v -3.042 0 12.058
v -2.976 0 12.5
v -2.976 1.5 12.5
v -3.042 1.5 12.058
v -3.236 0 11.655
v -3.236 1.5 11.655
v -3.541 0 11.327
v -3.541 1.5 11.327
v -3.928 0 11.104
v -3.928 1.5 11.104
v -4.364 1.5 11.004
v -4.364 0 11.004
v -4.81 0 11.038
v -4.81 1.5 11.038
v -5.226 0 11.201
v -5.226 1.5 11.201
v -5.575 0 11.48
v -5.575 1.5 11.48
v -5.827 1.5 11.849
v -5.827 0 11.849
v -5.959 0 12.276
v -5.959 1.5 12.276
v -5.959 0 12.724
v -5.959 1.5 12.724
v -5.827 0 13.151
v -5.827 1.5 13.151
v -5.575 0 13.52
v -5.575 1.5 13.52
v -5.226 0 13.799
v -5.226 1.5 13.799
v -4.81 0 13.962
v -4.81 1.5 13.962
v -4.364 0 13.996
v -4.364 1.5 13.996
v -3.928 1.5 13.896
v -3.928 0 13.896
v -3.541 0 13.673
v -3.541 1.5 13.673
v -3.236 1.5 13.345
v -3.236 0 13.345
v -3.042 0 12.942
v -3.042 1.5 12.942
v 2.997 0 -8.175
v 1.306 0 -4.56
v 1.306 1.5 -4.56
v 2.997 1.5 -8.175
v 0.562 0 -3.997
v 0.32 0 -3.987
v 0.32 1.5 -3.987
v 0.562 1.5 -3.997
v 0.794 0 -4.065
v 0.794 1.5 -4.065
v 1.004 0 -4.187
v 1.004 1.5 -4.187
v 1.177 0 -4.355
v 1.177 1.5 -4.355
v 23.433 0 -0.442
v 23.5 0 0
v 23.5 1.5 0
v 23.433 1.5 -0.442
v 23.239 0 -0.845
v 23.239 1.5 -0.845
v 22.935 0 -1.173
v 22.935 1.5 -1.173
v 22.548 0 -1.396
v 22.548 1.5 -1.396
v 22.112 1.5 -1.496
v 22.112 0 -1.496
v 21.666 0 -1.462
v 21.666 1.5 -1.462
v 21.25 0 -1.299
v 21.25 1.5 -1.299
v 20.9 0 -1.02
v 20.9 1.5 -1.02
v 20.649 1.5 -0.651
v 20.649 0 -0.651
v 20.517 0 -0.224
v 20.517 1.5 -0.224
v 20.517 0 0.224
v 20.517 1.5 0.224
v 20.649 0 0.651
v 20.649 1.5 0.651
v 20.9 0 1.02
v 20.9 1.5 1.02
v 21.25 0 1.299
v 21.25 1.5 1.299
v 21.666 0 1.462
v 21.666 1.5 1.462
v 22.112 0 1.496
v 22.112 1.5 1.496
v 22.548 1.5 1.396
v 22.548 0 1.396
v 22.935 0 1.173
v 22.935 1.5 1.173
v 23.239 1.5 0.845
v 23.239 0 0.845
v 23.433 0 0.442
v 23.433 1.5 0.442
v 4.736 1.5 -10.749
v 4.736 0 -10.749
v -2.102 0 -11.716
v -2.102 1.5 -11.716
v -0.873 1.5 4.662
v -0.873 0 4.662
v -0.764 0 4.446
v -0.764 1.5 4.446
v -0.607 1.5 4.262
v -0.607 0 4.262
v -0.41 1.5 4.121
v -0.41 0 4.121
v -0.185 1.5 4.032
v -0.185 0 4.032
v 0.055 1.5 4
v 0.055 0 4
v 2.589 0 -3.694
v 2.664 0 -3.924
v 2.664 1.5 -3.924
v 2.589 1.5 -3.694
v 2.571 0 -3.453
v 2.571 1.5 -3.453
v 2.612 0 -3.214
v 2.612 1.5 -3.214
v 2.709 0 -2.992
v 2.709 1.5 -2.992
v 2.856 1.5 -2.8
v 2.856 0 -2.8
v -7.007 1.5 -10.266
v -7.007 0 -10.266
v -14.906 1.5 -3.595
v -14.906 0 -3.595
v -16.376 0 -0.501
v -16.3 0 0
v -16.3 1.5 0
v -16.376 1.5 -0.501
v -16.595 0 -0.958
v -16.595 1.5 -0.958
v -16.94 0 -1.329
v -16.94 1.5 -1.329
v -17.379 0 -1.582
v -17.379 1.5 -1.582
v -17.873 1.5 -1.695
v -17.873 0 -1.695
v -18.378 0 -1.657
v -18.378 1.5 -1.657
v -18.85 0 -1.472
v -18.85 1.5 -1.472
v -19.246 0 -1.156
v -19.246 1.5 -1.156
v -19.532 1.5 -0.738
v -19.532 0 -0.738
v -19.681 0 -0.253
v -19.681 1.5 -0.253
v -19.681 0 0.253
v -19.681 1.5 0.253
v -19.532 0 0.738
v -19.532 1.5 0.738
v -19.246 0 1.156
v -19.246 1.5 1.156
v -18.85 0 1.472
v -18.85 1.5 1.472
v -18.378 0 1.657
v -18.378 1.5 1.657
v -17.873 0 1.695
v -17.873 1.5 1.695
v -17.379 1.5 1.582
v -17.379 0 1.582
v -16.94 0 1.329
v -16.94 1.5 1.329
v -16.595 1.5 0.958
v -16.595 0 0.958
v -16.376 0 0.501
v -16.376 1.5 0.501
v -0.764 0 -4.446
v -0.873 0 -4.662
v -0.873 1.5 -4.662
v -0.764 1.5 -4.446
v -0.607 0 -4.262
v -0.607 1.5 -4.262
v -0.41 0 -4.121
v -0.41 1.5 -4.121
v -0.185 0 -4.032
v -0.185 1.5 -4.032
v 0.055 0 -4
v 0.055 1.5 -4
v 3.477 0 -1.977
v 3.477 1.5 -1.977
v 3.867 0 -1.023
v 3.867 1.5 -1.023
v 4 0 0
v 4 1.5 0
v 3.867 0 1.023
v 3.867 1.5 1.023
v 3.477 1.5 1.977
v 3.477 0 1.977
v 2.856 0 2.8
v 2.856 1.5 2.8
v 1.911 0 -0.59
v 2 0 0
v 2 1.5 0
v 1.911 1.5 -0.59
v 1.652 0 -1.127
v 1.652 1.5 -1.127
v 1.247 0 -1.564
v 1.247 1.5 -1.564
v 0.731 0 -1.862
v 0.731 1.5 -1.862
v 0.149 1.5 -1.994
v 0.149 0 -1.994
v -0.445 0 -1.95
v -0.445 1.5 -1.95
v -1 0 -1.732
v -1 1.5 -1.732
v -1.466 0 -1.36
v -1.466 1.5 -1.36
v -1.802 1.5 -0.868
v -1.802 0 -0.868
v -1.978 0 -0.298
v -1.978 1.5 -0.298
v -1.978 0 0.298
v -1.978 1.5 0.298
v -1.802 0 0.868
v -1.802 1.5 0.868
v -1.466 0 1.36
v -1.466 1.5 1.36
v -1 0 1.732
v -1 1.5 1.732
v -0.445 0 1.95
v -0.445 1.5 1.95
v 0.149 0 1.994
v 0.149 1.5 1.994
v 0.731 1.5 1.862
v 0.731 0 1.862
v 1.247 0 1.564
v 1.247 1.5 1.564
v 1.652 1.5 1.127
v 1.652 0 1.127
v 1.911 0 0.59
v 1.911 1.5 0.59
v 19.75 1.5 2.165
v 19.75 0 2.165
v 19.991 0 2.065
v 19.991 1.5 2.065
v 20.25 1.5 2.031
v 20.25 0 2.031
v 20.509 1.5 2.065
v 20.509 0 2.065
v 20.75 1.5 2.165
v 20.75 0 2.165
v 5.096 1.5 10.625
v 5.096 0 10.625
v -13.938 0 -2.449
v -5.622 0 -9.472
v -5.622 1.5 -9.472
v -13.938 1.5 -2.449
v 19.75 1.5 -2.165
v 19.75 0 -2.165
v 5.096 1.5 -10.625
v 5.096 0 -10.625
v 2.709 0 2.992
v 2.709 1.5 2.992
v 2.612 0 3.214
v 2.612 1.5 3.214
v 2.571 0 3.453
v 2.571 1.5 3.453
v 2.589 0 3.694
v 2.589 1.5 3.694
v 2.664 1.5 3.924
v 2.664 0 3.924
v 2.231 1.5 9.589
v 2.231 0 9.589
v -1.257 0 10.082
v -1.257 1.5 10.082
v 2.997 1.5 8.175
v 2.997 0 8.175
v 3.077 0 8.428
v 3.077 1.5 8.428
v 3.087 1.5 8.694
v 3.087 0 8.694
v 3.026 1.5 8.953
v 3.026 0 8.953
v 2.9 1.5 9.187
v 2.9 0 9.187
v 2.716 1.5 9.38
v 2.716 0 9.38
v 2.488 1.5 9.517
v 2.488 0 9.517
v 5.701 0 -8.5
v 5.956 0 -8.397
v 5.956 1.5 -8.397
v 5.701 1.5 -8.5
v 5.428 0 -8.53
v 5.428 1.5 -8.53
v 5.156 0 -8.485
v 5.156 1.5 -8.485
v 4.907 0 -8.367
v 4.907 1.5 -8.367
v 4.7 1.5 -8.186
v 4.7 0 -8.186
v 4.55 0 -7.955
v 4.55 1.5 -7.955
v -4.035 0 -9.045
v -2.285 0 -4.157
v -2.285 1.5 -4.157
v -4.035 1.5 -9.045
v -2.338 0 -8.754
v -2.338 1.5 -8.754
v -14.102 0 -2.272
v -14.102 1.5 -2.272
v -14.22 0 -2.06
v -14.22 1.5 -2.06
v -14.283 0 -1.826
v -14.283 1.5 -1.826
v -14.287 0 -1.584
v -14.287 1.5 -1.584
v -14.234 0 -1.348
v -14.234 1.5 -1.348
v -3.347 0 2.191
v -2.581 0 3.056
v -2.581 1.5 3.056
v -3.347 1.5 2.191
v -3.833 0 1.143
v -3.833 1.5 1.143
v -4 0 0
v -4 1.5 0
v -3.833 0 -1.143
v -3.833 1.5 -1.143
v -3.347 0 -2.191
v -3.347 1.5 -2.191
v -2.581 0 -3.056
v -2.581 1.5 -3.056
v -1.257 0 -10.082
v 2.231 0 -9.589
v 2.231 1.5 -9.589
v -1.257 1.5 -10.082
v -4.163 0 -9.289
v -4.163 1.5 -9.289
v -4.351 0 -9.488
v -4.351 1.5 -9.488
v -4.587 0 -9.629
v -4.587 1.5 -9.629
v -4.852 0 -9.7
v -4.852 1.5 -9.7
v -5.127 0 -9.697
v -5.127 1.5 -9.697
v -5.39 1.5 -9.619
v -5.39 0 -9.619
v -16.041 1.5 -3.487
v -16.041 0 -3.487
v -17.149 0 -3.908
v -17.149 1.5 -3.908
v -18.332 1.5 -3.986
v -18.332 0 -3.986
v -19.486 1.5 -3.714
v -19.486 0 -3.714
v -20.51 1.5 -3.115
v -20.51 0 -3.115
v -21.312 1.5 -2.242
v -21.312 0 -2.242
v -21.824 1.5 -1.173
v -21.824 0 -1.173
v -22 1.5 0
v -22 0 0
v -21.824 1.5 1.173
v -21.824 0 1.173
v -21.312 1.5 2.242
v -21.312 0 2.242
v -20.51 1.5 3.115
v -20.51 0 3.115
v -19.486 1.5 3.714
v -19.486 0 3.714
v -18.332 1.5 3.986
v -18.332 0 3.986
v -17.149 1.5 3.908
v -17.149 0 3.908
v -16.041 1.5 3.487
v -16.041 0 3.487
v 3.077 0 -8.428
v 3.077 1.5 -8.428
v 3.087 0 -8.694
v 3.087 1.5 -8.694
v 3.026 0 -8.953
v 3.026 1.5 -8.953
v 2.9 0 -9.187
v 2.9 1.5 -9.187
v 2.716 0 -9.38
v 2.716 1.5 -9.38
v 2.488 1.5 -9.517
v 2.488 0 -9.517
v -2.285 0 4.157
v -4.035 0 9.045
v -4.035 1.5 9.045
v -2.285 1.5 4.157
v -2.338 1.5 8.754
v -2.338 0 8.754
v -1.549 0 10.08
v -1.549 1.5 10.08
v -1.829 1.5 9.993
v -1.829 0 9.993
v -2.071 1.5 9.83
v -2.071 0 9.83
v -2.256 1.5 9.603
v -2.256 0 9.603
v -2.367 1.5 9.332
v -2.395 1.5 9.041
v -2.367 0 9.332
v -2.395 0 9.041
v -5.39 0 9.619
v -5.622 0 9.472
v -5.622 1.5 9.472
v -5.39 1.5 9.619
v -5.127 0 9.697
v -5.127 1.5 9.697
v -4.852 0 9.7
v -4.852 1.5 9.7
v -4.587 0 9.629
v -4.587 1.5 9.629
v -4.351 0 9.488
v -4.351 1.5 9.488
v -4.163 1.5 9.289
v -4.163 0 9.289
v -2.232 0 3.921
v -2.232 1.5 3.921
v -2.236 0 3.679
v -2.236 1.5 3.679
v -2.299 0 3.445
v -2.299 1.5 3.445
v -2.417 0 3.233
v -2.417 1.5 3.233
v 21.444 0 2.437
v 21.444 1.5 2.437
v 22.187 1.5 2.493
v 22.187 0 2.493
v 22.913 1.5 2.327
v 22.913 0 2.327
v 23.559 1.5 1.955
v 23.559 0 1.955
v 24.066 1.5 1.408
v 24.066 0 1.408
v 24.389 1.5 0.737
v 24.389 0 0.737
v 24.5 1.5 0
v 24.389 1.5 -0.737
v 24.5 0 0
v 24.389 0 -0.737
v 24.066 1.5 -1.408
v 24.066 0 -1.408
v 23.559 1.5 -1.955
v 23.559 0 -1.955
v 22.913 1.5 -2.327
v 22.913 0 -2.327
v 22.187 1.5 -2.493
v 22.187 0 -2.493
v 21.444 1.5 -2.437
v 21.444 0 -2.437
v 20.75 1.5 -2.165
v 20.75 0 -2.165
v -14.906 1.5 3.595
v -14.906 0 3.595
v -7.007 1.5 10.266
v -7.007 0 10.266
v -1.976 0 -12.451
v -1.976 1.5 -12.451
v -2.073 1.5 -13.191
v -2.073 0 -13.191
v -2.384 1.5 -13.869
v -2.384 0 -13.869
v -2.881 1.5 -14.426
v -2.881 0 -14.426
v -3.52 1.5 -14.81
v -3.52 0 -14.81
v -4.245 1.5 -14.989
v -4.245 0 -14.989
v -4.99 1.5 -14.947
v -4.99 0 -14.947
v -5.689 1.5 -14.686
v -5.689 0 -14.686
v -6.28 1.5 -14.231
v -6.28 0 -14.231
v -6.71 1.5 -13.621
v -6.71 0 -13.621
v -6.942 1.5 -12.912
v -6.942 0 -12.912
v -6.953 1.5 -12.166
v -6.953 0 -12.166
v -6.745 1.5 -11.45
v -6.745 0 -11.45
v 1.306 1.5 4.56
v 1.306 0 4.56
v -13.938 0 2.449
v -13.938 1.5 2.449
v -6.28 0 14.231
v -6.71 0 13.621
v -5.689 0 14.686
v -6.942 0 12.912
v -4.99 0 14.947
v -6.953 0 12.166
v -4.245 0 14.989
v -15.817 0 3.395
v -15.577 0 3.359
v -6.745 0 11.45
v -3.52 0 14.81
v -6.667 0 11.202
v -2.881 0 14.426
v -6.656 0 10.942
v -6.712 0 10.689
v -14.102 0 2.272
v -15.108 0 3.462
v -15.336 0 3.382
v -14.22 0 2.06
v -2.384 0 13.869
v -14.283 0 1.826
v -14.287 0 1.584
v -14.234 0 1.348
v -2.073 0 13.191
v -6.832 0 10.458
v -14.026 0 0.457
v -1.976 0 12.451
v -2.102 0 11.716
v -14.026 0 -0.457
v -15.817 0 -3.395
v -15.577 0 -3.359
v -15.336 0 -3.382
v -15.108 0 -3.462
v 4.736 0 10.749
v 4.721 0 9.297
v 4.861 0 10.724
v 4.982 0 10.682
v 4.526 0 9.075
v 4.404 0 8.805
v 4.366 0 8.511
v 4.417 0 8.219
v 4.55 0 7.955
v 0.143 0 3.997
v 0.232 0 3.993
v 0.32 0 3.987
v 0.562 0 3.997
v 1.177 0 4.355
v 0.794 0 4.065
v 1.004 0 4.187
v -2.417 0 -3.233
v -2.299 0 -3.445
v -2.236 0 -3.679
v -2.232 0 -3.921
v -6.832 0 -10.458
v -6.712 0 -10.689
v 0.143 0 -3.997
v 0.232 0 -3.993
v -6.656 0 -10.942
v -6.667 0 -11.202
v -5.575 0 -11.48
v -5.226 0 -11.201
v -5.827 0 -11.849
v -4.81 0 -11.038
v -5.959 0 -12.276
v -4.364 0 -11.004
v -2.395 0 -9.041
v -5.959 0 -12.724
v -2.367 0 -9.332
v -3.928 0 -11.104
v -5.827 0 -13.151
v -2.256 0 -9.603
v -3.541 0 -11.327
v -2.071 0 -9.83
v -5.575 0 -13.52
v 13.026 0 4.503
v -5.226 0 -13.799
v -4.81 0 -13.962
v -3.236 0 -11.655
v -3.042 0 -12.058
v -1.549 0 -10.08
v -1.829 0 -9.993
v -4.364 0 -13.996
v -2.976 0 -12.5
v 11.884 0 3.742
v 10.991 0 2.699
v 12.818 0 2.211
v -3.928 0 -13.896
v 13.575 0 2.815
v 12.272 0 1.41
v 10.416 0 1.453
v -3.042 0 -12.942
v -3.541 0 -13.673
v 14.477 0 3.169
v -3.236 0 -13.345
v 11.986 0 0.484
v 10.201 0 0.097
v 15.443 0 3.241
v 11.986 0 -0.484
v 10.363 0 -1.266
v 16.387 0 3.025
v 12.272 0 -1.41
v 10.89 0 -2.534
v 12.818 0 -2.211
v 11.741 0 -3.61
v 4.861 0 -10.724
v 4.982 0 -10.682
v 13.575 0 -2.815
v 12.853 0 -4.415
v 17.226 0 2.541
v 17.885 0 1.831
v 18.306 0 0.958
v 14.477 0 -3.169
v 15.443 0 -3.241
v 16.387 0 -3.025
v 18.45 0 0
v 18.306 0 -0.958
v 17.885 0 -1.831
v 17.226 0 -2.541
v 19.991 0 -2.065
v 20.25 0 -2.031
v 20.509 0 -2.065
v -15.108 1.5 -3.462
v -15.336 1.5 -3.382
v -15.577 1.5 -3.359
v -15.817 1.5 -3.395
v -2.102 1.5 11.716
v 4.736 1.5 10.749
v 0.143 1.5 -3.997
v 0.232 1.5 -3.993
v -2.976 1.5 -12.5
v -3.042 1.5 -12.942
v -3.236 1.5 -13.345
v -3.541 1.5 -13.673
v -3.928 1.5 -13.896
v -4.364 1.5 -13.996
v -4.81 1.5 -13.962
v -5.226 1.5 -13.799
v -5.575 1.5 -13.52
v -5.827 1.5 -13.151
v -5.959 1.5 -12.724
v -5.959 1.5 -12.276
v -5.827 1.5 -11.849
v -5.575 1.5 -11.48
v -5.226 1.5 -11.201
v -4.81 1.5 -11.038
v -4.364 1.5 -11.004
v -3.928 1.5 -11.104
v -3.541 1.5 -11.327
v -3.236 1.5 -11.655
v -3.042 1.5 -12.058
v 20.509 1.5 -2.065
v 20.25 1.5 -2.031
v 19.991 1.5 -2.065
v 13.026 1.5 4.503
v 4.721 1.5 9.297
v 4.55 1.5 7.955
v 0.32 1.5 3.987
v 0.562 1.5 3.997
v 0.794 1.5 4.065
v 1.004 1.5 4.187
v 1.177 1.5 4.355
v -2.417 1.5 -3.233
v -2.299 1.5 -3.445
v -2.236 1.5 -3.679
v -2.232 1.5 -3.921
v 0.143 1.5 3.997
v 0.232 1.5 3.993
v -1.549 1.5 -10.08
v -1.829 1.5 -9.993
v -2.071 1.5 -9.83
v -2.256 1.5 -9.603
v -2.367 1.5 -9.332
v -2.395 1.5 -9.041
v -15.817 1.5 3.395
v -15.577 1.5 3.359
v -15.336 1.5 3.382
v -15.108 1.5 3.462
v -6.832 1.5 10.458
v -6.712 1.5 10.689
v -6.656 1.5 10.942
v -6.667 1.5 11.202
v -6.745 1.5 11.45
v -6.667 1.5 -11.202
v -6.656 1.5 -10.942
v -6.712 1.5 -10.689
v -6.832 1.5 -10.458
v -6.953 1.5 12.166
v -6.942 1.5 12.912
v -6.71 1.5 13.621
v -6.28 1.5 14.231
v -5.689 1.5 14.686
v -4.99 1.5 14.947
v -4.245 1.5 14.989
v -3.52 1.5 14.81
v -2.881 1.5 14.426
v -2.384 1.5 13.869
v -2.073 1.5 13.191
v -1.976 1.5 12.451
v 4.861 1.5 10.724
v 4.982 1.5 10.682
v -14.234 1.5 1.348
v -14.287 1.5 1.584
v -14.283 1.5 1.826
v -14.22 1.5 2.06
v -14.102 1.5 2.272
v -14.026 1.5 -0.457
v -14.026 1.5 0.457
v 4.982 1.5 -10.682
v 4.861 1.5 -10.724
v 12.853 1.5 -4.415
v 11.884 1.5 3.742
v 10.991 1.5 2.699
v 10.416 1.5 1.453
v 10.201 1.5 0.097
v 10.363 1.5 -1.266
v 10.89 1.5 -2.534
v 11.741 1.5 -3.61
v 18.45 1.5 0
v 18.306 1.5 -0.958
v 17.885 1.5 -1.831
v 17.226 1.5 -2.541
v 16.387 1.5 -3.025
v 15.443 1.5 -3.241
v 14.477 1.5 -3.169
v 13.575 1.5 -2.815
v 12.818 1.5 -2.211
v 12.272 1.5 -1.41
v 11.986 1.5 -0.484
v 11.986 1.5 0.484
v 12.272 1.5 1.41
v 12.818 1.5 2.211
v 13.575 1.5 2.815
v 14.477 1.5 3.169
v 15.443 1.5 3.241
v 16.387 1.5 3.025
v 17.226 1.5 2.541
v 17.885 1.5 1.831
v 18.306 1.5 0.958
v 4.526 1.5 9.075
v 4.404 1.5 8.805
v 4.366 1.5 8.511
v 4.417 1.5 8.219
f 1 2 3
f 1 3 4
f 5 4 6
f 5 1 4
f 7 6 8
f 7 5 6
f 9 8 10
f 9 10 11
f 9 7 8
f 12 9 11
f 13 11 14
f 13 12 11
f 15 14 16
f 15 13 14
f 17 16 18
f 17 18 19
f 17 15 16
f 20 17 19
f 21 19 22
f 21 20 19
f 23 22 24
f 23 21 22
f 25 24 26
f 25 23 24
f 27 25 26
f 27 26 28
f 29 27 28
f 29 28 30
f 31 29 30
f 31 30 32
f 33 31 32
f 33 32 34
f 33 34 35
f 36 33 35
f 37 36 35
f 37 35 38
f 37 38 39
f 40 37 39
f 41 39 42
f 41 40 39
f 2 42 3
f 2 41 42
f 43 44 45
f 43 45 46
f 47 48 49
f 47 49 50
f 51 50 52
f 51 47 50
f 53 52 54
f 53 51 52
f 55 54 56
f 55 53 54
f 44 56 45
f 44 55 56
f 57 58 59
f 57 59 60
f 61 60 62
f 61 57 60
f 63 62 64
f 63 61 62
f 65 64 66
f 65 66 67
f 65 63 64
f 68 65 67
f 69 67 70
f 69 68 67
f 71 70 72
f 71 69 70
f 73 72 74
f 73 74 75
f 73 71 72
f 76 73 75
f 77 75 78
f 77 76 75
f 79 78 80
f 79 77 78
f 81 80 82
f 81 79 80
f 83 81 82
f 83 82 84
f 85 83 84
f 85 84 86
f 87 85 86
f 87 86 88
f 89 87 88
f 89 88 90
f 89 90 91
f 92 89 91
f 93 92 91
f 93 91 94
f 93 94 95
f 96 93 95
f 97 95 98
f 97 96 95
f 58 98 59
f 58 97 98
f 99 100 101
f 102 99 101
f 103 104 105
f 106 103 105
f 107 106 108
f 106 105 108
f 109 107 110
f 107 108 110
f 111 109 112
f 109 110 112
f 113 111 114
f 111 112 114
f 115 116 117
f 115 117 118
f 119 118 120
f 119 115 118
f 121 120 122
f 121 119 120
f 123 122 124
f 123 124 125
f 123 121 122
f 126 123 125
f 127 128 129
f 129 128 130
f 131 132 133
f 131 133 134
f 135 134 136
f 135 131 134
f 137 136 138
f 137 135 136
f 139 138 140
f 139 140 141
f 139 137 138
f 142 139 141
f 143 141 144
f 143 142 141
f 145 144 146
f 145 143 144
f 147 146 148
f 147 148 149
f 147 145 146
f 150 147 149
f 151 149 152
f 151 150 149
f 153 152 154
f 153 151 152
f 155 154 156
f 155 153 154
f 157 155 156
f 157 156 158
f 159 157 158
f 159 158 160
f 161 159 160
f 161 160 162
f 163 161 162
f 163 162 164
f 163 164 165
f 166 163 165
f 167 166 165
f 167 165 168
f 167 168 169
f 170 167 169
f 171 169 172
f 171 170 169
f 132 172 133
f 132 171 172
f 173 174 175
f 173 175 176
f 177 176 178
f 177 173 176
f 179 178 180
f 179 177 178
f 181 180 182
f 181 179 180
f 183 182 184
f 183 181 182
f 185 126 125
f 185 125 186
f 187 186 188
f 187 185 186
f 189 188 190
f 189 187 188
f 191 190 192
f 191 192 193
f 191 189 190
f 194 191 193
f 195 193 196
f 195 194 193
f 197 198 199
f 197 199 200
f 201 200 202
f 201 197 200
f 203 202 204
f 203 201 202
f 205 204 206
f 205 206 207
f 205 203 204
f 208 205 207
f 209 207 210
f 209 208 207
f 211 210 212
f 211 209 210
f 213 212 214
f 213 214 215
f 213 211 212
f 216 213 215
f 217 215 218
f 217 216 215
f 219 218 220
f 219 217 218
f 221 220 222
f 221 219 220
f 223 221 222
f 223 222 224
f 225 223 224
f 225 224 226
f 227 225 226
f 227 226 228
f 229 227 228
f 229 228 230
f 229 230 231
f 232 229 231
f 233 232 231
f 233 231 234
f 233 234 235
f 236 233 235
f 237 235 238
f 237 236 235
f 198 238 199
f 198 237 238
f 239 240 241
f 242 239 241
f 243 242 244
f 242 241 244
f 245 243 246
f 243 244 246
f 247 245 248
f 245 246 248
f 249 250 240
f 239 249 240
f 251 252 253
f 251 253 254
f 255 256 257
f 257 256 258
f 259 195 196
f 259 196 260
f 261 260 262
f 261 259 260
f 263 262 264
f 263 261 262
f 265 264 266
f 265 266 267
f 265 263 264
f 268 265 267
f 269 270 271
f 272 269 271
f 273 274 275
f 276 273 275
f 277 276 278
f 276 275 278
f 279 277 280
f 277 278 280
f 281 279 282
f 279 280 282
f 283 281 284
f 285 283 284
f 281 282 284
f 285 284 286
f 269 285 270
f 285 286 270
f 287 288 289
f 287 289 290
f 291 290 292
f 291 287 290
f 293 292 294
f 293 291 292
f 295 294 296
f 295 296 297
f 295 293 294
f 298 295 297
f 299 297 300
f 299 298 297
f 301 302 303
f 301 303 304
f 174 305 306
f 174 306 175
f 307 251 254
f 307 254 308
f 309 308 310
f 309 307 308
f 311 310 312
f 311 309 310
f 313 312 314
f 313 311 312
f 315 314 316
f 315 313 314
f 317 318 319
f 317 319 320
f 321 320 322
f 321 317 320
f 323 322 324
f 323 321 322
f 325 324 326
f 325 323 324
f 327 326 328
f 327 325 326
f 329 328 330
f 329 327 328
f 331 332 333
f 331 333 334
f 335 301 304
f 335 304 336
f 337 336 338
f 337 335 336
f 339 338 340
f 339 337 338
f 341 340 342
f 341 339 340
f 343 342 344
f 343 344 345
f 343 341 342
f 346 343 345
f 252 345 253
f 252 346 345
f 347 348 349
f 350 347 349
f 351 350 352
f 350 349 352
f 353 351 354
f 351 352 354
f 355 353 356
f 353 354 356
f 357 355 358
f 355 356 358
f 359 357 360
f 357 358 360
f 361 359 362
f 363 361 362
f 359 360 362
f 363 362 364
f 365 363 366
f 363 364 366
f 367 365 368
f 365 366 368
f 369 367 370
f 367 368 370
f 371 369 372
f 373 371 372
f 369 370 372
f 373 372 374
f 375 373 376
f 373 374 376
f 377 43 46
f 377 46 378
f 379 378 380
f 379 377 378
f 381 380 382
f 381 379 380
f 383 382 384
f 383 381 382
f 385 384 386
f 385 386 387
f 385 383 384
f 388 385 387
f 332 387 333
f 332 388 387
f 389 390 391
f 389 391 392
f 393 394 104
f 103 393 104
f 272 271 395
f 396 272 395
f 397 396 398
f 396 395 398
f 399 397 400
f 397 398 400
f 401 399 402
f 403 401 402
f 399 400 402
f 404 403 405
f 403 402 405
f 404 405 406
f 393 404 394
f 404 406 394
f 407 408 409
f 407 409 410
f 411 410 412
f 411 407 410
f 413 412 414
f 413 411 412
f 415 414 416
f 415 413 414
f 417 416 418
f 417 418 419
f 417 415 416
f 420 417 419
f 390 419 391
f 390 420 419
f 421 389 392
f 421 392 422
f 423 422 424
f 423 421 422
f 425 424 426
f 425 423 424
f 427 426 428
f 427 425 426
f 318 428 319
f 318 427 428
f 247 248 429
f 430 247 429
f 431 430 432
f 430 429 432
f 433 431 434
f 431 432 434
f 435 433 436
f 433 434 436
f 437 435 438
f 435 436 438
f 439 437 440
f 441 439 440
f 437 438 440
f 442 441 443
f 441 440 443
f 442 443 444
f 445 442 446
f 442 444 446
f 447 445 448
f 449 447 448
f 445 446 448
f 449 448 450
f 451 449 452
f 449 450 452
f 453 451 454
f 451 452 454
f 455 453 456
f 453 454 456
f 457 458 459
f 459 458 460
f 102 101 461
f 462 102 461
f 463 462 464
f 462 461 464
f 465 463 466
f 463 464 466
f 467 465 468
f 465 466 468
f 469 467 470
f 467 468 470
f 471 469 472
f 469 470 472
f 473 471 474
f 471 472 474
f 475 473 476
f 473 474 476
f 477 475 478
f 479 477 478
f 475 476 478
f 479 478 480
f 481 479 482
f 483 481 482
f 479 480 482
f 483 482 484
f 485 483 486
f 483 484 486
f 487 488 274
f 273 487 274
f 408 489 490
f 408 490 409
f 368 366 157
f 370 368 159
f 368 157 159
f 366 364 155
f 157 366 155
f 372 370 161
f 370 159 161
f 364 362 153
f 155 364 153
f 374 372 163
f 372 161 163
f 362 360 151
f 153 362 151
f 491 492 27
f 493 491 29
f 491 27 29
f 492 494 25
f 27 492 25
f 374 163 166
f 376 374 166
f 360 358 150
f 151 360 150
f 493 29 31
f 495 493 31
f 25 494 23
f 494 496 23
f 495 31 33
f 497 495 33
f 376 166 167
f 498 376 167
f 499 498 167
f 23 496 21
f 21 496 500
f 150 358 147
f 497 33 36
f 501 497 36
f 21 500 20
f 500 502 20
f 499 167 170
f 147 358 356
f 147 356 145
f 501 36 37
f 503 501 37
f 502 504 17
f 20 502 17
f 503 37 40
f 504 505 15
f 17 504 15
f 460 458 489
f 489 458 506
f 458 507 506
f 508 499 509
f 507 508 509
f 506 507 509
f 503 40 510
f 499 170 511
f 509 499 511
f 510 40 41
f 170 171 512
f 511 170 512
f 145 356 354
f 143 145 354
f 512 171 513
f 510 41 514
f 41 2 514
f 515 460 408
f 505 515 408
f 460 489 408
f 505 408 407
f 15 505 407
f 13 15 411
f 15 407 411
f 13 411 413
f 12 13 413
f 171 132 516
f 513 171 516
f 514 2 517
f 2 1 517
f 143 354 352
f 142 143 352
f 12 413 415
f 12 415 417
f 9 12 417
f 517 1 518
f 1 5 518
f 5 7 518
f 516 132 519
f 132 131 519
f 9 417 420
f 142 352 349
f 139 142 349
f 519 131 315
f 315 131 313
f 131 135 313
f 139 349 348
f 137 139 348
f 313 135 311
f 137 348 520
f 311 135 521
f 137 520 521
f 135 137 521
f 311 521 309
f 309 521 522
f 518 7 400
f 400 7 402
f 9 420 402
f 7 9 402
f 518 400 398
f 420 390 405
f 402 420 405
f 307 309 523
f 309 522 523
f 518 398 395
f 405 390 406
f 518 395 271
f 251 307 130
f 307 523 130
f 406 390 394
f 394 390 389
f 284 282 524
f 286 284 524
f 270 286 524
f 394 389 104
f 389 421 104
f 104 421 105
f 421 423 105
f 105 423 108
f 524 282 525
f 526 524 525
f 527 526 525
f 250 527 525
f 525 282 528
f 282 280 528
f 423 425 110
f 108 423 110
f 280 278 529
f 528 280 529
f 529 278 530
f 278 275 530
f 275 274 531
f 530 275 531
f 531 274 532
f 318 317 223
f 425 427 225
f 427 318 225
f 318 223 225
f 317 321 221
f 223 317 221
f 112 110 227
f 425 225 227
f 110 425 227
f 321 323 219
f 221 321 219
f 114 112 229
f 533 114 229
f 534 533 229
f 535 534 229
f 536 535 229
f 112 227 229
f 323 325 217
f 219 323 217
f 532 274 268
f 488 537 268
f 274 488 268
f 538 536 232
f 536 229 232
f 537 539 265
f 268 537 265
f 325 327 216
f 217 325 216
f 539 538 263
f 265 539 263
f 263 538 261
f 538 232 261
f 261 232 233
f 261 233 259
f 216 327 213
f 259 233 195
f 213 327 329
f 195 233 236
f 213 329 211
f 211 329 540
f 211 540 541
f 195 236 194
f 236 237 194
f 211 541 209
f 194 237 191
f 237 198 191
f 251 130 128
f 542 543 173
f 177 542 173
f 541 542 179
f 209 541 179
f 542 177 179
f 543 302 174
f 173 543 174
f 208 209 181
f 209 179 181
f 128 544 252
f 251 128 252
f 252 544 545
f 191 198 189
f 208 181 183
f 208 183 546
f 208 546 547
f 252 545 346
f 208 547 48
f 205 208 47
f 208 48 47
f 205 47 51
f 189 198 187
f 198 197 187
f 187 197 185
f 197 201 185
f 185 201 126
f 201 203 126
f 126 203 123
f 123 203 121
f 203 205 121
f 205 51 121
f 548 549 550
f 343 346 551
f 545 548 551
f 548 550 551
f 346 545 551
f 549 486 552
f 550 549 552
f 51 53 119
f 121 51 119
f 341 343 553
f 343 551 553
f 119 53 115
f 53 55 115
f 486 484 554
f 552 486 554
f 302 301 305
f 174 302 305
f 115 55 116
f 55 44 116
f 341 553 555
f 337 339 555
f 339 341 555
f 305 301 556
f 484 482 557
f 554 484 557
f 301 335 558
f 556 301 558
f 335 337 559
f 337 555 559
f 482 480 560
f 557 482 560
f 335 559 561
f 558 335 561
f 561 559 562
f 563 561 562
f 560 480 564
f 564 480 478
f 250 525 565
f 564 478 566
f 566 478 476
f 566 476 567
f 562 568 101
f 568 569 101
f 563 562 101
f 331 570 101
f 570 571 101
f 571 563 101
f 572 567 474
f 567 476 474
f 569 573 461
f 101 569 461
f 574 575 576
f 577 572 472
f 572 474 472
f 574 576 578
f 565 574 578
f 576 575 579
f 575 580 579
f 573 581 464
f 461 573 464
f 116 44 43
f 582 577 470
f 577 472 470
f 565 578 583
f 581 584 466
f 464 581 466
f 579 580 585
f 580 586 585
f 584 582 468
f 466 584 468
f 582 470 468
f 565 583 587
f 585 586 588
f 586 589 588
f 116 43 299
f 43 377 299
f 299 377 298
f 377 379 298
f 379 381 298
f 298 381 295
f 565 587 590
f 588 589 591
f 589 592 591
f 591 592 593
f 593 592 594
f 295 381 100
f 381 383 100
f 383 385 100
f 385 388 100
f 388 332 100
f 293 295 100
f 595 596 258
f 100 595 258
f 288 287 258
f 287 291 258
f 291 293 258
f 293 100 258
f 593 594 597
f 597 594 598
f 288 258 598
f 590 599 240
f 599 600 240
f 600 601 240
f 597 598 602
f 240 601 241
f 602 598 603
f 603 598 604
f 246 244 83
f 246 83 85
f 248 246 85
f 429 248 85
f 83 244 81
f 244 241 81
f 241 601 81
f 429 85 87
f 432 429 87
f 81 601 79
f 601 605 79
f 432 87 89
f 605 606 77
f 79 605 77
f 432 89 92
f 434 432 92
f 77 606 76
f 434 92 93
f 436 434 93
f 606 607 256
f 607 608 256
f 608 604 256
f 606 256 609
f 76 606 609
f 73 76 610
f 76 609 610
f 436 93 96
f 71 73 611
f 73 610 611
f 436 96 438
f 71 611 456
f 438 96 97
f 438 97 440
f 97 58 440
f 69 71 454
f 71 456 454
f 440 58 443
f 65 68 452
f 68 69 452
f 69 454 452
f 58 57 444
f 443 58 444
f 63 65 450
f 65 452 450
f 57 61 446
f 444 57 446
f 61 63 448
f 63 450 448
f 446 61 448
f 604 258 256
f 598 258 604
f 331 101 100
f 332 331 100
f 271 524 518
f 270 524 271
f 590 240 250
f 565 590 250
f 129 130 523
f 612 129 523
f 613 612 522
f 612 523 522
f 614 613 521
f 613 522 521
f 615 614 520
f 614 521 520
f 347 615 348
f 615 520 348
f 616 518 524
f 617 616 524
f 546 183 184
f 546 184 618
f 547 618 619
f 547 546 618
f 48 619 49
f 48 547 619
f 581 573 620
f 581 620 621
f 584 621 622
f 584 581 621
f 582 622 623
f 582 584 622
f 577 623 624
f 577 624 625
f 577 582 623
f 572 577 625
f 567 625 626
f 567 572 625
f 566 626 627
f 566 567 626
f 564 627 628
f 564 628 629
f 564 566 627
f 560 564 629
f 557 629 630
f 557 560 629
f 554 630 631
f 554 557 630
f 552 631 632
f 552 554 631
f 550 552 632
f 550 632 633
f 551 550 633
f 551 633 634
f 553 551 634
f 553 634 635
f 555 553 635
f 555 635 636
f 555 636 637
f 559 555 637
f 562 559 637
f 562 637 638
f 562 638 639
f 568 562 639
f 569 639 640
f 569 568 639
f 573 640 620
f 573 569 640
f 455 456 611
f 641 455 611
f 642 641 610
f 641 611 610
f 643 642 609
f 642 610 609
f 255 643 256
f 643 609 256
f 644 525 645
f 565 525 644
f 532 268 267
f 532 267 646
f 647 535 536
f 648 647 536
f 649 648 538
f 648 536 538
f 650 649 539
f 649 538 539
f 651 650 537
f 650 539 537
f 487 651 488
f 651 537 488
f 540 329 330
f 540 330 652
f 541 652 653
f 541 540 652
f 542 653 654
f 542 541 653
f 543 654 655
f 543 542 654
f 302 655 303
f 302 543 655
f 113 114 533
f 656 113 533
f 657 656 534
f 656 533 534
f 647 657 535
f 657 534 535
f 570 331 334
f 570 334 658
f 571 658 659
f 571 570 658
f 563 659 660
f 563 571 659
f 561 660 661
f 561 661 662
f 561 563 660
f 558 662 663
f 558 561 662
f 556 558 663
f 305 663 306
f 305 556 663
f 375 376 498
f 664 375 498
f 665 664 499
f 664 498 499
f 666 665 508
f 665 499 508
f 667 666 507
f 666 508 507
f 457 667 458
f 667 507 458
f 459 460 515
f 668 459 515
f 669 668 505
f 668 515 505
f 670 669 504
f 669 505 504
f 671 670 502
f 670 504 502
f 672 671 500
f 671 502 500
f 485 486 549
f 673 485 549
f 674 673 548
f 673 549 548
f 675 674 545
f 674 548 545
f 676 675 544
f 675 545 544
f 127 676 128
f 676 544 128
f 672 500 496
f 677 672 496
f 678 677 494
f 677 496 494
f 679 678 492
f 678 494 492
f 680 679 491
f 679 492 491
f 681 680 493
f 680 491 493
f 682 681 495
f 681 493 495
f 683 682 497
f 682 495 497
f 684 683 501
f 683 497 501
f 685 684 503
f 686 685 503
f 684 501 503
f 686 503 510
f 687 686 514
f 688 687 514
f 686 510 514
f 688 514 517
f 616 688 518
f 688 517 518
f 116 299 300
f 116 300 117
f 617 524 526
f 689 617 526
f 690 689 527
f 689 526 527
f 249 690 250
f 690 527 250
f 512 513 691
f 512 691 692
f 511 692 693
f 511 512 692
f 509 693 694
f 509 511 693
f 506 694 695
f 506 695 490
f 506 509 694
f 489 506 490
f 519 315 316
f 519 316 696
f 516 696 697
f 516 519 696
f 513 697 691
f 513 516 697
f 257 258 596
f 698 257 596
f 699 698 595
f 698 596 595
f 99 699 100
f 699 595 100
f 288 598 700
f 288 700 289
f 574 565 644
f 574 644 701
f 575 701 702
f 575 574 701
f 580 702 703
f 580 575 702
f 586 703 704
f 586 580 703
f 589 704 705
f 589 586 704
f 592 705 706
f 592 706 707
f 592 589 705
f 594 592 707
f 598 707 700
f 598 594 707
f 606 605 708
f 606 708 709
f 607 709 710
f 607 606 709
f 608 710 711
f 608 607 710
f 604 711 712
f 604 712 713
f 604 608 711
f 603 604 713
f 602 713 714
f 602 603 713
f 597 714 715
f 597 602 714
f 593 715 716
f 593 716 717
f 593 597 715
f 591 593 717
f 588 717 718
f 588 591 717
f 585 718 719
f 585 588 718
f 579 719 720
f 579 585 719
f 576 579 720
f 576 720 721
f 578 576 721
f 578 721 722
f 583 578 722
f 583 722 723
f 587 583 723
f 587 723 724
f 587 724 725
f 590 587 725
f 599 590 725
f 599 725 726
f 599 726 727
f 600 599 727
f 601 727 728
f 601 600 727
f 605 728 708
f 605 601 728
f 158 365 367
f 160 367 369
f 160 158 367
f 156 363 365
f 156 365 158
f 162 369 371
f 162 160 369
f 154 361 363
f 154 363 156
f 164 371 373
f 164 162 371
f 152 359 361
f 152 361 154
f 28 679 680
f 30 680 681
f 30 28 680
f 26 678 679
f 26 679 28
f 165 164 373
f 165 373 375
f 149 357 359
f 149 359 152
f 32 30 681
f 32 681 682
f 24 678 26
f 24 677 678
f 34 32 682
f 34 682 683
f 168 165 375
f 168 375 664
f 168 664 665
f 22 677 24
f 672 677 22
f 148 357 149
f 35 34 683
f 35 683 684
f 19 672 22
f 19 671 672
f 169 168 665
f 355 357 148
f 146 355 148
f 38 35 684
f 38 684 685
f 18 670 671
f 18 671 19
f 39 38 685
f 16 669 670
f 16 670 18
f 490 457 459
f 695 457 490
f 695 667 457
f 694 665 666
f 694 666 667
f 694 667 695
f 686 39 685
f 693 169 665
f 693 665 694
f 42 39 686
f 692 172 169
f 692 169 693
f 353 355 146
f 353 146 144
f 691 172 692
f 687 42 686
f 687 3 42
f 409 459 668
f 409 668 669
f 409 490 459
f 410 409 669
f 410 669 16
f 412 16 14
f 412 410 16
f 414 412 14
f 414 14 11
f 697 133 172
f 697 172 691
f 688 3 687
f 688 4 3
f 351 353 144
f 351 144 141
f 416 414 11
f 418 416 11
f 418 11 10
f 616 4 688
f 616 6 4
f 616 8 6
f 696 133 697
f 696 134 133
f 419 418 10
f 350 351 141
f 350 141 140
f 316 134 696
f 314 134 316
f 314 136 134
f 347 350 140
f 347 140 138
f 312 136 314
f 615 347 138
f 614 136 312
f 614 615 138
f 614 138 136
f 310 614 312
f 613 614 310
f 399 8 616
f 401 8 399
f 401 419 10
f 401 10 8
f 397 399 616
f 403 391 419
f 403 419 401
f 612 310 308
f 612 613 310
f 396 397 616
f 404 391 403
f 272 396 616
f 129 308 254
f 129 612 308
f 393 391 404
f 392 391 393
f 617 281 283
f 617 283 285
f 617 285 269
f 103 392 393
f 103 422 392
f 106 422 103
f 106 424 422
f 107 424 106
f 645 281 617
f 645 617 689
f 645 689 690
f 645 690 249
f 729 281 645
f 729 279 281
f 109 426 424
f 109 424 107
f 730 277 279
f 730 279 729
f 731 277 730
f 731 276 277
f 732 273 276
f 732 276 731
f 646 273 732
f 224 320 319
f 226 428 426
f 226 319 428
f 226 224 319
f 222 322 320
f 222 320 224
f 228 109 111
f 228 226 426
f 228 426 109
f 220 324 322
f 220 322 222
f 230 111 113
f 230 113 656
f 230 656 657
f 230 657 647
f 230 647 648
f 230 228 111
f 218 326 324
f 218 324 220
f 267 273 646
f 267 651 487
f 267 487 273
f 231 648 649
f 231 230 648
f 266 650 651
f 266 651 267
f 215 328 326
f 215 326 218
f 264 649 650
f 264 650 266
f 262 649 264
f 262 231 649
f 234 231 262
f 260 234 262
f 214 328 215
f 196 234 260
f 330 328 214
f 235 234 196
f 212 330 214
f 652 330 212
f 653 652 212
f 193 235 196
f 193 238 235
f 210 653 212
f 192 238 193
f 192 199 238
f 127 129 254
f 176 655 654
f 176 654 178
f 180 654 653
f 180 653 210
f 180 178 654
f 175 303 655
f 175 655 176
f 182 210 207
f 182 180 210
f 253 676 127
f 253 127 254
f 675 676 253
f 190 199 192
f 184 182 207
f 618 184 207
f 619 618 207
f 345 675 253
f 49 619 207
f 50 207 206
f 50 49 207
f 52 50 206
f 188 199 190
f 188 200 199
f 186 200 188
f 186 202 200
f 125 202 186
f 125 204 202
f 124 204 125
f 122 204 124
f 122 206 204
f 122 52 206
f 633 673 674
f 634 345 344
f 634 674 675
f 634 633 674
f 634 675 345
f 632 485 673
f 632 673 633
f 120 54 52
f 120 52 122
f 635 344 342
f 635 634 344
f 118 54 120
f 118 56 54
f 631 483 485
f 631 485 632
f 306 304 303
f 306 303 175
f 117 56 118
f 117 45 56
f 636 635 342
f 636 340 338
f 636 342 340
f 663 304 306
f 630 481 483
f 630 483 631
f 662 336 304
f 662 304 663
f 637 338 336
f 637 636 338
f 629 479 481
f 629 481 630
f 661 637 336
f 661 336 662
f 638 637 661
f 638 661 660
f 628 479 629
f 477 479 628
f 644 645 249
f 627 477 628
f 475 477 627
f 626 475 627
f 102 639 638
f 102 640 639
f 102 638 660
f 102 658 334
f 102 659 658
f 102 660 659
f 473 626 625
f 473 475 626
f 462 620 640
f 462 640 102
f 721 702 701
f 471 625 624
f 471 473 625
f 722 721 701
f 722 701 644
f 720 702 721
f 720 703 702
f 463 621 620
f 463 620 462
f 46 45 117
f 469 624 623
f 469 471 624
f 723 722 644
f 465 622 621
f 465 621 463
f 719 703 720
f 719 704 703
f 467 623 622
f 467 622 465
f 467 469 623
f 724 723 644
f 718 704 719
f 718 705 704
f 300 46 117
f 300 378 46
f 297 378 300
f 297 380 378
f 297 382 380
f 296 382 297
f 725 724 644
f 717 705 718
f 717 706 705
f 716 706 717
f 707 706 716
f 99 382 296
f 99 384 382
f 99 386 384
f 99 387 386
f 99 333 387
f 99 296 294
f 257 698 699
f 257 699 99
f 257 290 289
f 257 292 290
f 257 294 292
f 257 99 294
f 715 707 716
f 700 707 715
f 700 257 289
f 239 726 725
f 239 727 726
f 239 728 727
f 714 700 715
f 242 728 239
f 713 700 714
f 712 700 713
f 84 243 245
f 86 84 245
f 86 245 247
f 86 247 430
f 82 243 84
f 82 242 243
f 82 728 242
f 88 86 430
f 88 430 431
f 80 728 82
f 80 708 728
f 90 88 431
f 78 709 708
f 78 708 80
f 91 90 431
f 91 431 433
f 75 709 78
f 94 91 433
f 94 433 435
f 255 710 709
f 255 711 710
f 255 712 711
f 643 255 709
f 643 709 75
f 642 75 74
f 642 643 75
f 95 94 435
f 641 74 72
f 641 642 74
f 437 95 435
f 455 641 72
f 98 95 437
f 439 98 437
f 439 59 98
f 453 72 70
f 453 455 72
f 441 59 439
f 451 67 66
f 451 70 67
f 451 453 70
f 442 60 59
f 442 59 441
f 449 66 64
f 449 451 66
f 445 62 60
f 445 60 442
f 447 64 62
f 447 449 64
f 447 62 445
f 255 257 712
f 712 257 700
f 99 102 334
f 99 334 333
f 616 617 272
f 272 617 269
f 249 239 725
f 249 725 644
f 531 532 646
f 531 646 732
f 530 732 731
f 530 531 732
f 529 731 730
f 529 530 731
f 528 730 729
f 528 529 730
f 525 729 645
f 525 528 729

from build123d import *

# Parameters (mm, degrees)
SKETCH_1_R      = 2
SKETCH_1_R_2    = 1.7
SKETCH_1_R_3    = 1.5
SKETCH_1_R_4    = 3.25
EXTRUDE_1_DEPTH = 1.5


with BuildPart() as part:
    # 草图1 → 凸台-拉伸1 (new body)
    with BuildSketch(Plane(origin=(0, 0, 0), x_dir=(1, 0, 0), z_dir=(0, 1, 0))):
        with BuildLine():
            Line((19.75, 2.165063509), (5.096488448, 10.625272348))
            ThreePointArc((5.096488448, 10.625272348), (4.922427124, 10.704637858), (4.736437674, 10.749405626))
            Line((4.736437674, 10.749405626), (-2.101908222, 11.7159388))
            ThreePointArc((-2.101908222, 11.7159388), (-4.61878361, 14.995906411), (-6.744553684, 11.449929699))
            ThreePointArc((-6.744553684, 11.449929699), (-6.675732942, 10.813623622), (-7.006838923, 10.265909693))
            Line((-7.006838923, 10.265909693), (-14.905573539, 3.595069524))
            ThreePointArc((-14.905573539, 3.595069524), (-15.456234647, 3.363542696), (-16.040639512, 3.487249128))
            ThreePointArc((-16.040639512, 3.487249128), (-22, 0), (-16.040639512, -3.487249128))
            ThreePointArc((-16.040639512, -3.487249128), (-15.456234647, -3.363542696), (-14.905573539, -3.595069524))
            Line((-14.905573539, -3.595069524), (-7.006838923, -10.265909693))
            ThreePointArc((-7.006838923, -10.265909693), (-6.675732942, -10.813623622), (-6.744553684, -11.449929699))
            ThreePointArc((-6.744553684, -11.449929699), (-4.61878361, -14.995906411), (-2.101908222, -11.7159388))
            Line((-2.101908222, -11.7159388), (4.736437674, -10.749405626))
            ThreePointArc((4.736437674, -10.749405626), (4.922427124, -10.704637858), (5.096488448, -10.625272348))
            Line((5.096488448, -10.625272348), (19.75, -2.165063509))
            ThreePointArc((19.75, -2.165063509), (20.25, -2.031088913), (20.75, -2.165063509))
            ThreePointArc((20.75, -2.165063509), (24.5, 0), (20.75, 2.165063509))
            ThreePointArc((20.75, 2.165063509), (20.25, 2.031088913), (19.75, 2.165063509))
        make_face()
        Circle(SKETCH_1_R, mode=Mode.SUBTRACT)
        with Locations((-18, 0)):
            Circle(SKETCH_1_R_2, mode=Mode.SUBTRACT)
        with Locations((22, 0)):
            Circle(SKETCH_1_R_3, mode=Mode.SUBTRACT)
        with Locations((-4.47577596, 12.5)):
            Circle(SKETCH_1_R_3, mode=Mode.SUBTRACT)
        with Locations((-4.47577596, -12.5)):
            Circle(SKETCH_1_R_3, mode=Mode.SUBTRACT)
        with Locations((15.2, 0)):
            Circle(SKETCH_1_R_4, mode=Mode.SUBTRACT)
        with BuildLine():
            Line((2.23143448, 9.588554578), (-1.256530939, 10.081544307))
            ThreePointArc((-1.256530939, 10.081544307), (-2.171731289, 9.72303877), (-2.33794765, 8.754281823))
            Line((-2.33794765, 8.754281823), (-0.872808817, 4.662424773))
            ThreePointArc((-0.872808817, 4.662424773), (-0.512657064, 4.185850496), (0.054926934, 3.999622861))
            ThreePointArc((0.054926934, 3.999622861), (0.187612888, 3.995597753), (0.320092213, 3.987172052))
            ThreePointArc((0.320092213, 3.987172052), (0.902629068, 4.119395878), (1.305852753, 4.56012594))
            Line((1.305852753, 4.56012594), (2.997222742, 8.174556771))
            ThreePointArc((2.997222742, 8.174556771), (2.970810351, 9.074617878), (2.23143448, 9.588554578))
        make_face(mode=Mode.SUBTRACT)
        with BuildLine():
            Line((12.853062501, 4.414961424), (5.956182941, 8.396876694))
            ThreePointArc((5.956182941, 8.396876694), (5.156119776, 8.484770625), (4.550445454, 7.954690416))
            Line((4.550445454, 7.954690416), (2.664458984, 3.924367251))
            ThreePointArc((2.664458984, 3.924367251), (2.584431714, 3.332397688), (2.856157177, 2.800422501))
            ThreePointArc((2.856157177, 2.800422501), (4, 0), (2.856157177, -2.800422501))
            ThreePointArc((2.856157177, -2.800422501), (2.584431714, -3.332397688), (2.664458984, -3.924367251))
            Line((2.664458984, -3.924367251), (4.550445454, -7.954690416))
            ThreePointArc((4.550445454, -7.954690416), (4.374221674, -8.659373504), (4.721405489, -9.297414626))
            Line((4.721405489, -9.297414626), (13.026112738, -4.50268966))
            ThreePointArc((13.026112738, -4.50268966), (10.200941154, -0.097008541), (12.853062501, 4.414961424))
        make_face(mode=Mode.SUBTRACT)
        with BuildLine():
            Line((-2.33794765, -8.754281823), (-0.872808817, -4.662424773))
            ThreePointArc((-0.872808817, -4.662424773), (-0.512657064, -4.185850496), (0.054926934, -3.999622861))
            ThreePointArc((0.054926934, -3.999622861), (0.187612888, -3.995597753), (0.320092213, -3.987172052))
            ThreePointArc((0.320092213, -3.987172052), (0.902629068, -4.119395878), (1.305852753, -4.56012594))
            Line((1.305852753, -4.56012594), (2.997222742, -8.174556771))
            ThreePointArc((2.997222742, -8.174556771), (2.970810351, -9.074617878), (2.23143448, -9.588554578))
            Line((2.23143448, -9.588554578), (-1.256530939, -10.081544307))
            ThreePointArc((-1.256530939, -10.081544307), (-2.171731289, -9.72303877), (-2.33794765, -8.754281823))
        make_face(mode=Mode.SUBTRACT)
        with BuildLine():
            Line((-5.622052564, 9.472053038), (-13.937734763, 2.449081695))
            ThreePointArc((-13.937734763, 2.449081695), (-14.258158429, 1.944937864), (-14.23400713, 1.348071847))
            ThreePointArc((-14.23400713, 1.348071847), (-14, 0), (-14.23400713, -1.348071847))
            ThreePointArc((-14.23400713, -1.348071847), (-14.258158429, -1.944937864), (-13.937734763, -2.449081695))
            Line((-13.937734763, -2.449081695), (-5.622052564, -9.472053038))
            ThreePointArc((-5.622052564, -9.472053038), (-4.717022681, -9.673722513), (-4.035359228, -9.045164955))
            Line((-4.035359228, -9.045164955), (-2.285010045, -4.156769069))
            ThreePointArc((-2.285010045, -4.156769069), (-2.260804326, -3.559905256), (-2.581182025, -3.055732213))
            ThreePointArc((-2.581182025, -3.055732213), (-4, 0), (-2.581182025, 3.055732213))
            ThreePointArc((-2.581182025, 3.055732213), (-2.260804326, 3.559905256), (-2.285010045, 4.156769069))
            Line((-2.285010045, 4.156769069), (-4.035359228, 9.045164955))
            ThreePointArc((-4.035359228, 9.045164955), (-4.717022681, 9.673722513), (-5.622052564, 9.472053038))
        make_face(mode=Mode.SUBTRACT)
    extrude(amount=EXTRUDE_1_DEPTH)


solid = part.part
